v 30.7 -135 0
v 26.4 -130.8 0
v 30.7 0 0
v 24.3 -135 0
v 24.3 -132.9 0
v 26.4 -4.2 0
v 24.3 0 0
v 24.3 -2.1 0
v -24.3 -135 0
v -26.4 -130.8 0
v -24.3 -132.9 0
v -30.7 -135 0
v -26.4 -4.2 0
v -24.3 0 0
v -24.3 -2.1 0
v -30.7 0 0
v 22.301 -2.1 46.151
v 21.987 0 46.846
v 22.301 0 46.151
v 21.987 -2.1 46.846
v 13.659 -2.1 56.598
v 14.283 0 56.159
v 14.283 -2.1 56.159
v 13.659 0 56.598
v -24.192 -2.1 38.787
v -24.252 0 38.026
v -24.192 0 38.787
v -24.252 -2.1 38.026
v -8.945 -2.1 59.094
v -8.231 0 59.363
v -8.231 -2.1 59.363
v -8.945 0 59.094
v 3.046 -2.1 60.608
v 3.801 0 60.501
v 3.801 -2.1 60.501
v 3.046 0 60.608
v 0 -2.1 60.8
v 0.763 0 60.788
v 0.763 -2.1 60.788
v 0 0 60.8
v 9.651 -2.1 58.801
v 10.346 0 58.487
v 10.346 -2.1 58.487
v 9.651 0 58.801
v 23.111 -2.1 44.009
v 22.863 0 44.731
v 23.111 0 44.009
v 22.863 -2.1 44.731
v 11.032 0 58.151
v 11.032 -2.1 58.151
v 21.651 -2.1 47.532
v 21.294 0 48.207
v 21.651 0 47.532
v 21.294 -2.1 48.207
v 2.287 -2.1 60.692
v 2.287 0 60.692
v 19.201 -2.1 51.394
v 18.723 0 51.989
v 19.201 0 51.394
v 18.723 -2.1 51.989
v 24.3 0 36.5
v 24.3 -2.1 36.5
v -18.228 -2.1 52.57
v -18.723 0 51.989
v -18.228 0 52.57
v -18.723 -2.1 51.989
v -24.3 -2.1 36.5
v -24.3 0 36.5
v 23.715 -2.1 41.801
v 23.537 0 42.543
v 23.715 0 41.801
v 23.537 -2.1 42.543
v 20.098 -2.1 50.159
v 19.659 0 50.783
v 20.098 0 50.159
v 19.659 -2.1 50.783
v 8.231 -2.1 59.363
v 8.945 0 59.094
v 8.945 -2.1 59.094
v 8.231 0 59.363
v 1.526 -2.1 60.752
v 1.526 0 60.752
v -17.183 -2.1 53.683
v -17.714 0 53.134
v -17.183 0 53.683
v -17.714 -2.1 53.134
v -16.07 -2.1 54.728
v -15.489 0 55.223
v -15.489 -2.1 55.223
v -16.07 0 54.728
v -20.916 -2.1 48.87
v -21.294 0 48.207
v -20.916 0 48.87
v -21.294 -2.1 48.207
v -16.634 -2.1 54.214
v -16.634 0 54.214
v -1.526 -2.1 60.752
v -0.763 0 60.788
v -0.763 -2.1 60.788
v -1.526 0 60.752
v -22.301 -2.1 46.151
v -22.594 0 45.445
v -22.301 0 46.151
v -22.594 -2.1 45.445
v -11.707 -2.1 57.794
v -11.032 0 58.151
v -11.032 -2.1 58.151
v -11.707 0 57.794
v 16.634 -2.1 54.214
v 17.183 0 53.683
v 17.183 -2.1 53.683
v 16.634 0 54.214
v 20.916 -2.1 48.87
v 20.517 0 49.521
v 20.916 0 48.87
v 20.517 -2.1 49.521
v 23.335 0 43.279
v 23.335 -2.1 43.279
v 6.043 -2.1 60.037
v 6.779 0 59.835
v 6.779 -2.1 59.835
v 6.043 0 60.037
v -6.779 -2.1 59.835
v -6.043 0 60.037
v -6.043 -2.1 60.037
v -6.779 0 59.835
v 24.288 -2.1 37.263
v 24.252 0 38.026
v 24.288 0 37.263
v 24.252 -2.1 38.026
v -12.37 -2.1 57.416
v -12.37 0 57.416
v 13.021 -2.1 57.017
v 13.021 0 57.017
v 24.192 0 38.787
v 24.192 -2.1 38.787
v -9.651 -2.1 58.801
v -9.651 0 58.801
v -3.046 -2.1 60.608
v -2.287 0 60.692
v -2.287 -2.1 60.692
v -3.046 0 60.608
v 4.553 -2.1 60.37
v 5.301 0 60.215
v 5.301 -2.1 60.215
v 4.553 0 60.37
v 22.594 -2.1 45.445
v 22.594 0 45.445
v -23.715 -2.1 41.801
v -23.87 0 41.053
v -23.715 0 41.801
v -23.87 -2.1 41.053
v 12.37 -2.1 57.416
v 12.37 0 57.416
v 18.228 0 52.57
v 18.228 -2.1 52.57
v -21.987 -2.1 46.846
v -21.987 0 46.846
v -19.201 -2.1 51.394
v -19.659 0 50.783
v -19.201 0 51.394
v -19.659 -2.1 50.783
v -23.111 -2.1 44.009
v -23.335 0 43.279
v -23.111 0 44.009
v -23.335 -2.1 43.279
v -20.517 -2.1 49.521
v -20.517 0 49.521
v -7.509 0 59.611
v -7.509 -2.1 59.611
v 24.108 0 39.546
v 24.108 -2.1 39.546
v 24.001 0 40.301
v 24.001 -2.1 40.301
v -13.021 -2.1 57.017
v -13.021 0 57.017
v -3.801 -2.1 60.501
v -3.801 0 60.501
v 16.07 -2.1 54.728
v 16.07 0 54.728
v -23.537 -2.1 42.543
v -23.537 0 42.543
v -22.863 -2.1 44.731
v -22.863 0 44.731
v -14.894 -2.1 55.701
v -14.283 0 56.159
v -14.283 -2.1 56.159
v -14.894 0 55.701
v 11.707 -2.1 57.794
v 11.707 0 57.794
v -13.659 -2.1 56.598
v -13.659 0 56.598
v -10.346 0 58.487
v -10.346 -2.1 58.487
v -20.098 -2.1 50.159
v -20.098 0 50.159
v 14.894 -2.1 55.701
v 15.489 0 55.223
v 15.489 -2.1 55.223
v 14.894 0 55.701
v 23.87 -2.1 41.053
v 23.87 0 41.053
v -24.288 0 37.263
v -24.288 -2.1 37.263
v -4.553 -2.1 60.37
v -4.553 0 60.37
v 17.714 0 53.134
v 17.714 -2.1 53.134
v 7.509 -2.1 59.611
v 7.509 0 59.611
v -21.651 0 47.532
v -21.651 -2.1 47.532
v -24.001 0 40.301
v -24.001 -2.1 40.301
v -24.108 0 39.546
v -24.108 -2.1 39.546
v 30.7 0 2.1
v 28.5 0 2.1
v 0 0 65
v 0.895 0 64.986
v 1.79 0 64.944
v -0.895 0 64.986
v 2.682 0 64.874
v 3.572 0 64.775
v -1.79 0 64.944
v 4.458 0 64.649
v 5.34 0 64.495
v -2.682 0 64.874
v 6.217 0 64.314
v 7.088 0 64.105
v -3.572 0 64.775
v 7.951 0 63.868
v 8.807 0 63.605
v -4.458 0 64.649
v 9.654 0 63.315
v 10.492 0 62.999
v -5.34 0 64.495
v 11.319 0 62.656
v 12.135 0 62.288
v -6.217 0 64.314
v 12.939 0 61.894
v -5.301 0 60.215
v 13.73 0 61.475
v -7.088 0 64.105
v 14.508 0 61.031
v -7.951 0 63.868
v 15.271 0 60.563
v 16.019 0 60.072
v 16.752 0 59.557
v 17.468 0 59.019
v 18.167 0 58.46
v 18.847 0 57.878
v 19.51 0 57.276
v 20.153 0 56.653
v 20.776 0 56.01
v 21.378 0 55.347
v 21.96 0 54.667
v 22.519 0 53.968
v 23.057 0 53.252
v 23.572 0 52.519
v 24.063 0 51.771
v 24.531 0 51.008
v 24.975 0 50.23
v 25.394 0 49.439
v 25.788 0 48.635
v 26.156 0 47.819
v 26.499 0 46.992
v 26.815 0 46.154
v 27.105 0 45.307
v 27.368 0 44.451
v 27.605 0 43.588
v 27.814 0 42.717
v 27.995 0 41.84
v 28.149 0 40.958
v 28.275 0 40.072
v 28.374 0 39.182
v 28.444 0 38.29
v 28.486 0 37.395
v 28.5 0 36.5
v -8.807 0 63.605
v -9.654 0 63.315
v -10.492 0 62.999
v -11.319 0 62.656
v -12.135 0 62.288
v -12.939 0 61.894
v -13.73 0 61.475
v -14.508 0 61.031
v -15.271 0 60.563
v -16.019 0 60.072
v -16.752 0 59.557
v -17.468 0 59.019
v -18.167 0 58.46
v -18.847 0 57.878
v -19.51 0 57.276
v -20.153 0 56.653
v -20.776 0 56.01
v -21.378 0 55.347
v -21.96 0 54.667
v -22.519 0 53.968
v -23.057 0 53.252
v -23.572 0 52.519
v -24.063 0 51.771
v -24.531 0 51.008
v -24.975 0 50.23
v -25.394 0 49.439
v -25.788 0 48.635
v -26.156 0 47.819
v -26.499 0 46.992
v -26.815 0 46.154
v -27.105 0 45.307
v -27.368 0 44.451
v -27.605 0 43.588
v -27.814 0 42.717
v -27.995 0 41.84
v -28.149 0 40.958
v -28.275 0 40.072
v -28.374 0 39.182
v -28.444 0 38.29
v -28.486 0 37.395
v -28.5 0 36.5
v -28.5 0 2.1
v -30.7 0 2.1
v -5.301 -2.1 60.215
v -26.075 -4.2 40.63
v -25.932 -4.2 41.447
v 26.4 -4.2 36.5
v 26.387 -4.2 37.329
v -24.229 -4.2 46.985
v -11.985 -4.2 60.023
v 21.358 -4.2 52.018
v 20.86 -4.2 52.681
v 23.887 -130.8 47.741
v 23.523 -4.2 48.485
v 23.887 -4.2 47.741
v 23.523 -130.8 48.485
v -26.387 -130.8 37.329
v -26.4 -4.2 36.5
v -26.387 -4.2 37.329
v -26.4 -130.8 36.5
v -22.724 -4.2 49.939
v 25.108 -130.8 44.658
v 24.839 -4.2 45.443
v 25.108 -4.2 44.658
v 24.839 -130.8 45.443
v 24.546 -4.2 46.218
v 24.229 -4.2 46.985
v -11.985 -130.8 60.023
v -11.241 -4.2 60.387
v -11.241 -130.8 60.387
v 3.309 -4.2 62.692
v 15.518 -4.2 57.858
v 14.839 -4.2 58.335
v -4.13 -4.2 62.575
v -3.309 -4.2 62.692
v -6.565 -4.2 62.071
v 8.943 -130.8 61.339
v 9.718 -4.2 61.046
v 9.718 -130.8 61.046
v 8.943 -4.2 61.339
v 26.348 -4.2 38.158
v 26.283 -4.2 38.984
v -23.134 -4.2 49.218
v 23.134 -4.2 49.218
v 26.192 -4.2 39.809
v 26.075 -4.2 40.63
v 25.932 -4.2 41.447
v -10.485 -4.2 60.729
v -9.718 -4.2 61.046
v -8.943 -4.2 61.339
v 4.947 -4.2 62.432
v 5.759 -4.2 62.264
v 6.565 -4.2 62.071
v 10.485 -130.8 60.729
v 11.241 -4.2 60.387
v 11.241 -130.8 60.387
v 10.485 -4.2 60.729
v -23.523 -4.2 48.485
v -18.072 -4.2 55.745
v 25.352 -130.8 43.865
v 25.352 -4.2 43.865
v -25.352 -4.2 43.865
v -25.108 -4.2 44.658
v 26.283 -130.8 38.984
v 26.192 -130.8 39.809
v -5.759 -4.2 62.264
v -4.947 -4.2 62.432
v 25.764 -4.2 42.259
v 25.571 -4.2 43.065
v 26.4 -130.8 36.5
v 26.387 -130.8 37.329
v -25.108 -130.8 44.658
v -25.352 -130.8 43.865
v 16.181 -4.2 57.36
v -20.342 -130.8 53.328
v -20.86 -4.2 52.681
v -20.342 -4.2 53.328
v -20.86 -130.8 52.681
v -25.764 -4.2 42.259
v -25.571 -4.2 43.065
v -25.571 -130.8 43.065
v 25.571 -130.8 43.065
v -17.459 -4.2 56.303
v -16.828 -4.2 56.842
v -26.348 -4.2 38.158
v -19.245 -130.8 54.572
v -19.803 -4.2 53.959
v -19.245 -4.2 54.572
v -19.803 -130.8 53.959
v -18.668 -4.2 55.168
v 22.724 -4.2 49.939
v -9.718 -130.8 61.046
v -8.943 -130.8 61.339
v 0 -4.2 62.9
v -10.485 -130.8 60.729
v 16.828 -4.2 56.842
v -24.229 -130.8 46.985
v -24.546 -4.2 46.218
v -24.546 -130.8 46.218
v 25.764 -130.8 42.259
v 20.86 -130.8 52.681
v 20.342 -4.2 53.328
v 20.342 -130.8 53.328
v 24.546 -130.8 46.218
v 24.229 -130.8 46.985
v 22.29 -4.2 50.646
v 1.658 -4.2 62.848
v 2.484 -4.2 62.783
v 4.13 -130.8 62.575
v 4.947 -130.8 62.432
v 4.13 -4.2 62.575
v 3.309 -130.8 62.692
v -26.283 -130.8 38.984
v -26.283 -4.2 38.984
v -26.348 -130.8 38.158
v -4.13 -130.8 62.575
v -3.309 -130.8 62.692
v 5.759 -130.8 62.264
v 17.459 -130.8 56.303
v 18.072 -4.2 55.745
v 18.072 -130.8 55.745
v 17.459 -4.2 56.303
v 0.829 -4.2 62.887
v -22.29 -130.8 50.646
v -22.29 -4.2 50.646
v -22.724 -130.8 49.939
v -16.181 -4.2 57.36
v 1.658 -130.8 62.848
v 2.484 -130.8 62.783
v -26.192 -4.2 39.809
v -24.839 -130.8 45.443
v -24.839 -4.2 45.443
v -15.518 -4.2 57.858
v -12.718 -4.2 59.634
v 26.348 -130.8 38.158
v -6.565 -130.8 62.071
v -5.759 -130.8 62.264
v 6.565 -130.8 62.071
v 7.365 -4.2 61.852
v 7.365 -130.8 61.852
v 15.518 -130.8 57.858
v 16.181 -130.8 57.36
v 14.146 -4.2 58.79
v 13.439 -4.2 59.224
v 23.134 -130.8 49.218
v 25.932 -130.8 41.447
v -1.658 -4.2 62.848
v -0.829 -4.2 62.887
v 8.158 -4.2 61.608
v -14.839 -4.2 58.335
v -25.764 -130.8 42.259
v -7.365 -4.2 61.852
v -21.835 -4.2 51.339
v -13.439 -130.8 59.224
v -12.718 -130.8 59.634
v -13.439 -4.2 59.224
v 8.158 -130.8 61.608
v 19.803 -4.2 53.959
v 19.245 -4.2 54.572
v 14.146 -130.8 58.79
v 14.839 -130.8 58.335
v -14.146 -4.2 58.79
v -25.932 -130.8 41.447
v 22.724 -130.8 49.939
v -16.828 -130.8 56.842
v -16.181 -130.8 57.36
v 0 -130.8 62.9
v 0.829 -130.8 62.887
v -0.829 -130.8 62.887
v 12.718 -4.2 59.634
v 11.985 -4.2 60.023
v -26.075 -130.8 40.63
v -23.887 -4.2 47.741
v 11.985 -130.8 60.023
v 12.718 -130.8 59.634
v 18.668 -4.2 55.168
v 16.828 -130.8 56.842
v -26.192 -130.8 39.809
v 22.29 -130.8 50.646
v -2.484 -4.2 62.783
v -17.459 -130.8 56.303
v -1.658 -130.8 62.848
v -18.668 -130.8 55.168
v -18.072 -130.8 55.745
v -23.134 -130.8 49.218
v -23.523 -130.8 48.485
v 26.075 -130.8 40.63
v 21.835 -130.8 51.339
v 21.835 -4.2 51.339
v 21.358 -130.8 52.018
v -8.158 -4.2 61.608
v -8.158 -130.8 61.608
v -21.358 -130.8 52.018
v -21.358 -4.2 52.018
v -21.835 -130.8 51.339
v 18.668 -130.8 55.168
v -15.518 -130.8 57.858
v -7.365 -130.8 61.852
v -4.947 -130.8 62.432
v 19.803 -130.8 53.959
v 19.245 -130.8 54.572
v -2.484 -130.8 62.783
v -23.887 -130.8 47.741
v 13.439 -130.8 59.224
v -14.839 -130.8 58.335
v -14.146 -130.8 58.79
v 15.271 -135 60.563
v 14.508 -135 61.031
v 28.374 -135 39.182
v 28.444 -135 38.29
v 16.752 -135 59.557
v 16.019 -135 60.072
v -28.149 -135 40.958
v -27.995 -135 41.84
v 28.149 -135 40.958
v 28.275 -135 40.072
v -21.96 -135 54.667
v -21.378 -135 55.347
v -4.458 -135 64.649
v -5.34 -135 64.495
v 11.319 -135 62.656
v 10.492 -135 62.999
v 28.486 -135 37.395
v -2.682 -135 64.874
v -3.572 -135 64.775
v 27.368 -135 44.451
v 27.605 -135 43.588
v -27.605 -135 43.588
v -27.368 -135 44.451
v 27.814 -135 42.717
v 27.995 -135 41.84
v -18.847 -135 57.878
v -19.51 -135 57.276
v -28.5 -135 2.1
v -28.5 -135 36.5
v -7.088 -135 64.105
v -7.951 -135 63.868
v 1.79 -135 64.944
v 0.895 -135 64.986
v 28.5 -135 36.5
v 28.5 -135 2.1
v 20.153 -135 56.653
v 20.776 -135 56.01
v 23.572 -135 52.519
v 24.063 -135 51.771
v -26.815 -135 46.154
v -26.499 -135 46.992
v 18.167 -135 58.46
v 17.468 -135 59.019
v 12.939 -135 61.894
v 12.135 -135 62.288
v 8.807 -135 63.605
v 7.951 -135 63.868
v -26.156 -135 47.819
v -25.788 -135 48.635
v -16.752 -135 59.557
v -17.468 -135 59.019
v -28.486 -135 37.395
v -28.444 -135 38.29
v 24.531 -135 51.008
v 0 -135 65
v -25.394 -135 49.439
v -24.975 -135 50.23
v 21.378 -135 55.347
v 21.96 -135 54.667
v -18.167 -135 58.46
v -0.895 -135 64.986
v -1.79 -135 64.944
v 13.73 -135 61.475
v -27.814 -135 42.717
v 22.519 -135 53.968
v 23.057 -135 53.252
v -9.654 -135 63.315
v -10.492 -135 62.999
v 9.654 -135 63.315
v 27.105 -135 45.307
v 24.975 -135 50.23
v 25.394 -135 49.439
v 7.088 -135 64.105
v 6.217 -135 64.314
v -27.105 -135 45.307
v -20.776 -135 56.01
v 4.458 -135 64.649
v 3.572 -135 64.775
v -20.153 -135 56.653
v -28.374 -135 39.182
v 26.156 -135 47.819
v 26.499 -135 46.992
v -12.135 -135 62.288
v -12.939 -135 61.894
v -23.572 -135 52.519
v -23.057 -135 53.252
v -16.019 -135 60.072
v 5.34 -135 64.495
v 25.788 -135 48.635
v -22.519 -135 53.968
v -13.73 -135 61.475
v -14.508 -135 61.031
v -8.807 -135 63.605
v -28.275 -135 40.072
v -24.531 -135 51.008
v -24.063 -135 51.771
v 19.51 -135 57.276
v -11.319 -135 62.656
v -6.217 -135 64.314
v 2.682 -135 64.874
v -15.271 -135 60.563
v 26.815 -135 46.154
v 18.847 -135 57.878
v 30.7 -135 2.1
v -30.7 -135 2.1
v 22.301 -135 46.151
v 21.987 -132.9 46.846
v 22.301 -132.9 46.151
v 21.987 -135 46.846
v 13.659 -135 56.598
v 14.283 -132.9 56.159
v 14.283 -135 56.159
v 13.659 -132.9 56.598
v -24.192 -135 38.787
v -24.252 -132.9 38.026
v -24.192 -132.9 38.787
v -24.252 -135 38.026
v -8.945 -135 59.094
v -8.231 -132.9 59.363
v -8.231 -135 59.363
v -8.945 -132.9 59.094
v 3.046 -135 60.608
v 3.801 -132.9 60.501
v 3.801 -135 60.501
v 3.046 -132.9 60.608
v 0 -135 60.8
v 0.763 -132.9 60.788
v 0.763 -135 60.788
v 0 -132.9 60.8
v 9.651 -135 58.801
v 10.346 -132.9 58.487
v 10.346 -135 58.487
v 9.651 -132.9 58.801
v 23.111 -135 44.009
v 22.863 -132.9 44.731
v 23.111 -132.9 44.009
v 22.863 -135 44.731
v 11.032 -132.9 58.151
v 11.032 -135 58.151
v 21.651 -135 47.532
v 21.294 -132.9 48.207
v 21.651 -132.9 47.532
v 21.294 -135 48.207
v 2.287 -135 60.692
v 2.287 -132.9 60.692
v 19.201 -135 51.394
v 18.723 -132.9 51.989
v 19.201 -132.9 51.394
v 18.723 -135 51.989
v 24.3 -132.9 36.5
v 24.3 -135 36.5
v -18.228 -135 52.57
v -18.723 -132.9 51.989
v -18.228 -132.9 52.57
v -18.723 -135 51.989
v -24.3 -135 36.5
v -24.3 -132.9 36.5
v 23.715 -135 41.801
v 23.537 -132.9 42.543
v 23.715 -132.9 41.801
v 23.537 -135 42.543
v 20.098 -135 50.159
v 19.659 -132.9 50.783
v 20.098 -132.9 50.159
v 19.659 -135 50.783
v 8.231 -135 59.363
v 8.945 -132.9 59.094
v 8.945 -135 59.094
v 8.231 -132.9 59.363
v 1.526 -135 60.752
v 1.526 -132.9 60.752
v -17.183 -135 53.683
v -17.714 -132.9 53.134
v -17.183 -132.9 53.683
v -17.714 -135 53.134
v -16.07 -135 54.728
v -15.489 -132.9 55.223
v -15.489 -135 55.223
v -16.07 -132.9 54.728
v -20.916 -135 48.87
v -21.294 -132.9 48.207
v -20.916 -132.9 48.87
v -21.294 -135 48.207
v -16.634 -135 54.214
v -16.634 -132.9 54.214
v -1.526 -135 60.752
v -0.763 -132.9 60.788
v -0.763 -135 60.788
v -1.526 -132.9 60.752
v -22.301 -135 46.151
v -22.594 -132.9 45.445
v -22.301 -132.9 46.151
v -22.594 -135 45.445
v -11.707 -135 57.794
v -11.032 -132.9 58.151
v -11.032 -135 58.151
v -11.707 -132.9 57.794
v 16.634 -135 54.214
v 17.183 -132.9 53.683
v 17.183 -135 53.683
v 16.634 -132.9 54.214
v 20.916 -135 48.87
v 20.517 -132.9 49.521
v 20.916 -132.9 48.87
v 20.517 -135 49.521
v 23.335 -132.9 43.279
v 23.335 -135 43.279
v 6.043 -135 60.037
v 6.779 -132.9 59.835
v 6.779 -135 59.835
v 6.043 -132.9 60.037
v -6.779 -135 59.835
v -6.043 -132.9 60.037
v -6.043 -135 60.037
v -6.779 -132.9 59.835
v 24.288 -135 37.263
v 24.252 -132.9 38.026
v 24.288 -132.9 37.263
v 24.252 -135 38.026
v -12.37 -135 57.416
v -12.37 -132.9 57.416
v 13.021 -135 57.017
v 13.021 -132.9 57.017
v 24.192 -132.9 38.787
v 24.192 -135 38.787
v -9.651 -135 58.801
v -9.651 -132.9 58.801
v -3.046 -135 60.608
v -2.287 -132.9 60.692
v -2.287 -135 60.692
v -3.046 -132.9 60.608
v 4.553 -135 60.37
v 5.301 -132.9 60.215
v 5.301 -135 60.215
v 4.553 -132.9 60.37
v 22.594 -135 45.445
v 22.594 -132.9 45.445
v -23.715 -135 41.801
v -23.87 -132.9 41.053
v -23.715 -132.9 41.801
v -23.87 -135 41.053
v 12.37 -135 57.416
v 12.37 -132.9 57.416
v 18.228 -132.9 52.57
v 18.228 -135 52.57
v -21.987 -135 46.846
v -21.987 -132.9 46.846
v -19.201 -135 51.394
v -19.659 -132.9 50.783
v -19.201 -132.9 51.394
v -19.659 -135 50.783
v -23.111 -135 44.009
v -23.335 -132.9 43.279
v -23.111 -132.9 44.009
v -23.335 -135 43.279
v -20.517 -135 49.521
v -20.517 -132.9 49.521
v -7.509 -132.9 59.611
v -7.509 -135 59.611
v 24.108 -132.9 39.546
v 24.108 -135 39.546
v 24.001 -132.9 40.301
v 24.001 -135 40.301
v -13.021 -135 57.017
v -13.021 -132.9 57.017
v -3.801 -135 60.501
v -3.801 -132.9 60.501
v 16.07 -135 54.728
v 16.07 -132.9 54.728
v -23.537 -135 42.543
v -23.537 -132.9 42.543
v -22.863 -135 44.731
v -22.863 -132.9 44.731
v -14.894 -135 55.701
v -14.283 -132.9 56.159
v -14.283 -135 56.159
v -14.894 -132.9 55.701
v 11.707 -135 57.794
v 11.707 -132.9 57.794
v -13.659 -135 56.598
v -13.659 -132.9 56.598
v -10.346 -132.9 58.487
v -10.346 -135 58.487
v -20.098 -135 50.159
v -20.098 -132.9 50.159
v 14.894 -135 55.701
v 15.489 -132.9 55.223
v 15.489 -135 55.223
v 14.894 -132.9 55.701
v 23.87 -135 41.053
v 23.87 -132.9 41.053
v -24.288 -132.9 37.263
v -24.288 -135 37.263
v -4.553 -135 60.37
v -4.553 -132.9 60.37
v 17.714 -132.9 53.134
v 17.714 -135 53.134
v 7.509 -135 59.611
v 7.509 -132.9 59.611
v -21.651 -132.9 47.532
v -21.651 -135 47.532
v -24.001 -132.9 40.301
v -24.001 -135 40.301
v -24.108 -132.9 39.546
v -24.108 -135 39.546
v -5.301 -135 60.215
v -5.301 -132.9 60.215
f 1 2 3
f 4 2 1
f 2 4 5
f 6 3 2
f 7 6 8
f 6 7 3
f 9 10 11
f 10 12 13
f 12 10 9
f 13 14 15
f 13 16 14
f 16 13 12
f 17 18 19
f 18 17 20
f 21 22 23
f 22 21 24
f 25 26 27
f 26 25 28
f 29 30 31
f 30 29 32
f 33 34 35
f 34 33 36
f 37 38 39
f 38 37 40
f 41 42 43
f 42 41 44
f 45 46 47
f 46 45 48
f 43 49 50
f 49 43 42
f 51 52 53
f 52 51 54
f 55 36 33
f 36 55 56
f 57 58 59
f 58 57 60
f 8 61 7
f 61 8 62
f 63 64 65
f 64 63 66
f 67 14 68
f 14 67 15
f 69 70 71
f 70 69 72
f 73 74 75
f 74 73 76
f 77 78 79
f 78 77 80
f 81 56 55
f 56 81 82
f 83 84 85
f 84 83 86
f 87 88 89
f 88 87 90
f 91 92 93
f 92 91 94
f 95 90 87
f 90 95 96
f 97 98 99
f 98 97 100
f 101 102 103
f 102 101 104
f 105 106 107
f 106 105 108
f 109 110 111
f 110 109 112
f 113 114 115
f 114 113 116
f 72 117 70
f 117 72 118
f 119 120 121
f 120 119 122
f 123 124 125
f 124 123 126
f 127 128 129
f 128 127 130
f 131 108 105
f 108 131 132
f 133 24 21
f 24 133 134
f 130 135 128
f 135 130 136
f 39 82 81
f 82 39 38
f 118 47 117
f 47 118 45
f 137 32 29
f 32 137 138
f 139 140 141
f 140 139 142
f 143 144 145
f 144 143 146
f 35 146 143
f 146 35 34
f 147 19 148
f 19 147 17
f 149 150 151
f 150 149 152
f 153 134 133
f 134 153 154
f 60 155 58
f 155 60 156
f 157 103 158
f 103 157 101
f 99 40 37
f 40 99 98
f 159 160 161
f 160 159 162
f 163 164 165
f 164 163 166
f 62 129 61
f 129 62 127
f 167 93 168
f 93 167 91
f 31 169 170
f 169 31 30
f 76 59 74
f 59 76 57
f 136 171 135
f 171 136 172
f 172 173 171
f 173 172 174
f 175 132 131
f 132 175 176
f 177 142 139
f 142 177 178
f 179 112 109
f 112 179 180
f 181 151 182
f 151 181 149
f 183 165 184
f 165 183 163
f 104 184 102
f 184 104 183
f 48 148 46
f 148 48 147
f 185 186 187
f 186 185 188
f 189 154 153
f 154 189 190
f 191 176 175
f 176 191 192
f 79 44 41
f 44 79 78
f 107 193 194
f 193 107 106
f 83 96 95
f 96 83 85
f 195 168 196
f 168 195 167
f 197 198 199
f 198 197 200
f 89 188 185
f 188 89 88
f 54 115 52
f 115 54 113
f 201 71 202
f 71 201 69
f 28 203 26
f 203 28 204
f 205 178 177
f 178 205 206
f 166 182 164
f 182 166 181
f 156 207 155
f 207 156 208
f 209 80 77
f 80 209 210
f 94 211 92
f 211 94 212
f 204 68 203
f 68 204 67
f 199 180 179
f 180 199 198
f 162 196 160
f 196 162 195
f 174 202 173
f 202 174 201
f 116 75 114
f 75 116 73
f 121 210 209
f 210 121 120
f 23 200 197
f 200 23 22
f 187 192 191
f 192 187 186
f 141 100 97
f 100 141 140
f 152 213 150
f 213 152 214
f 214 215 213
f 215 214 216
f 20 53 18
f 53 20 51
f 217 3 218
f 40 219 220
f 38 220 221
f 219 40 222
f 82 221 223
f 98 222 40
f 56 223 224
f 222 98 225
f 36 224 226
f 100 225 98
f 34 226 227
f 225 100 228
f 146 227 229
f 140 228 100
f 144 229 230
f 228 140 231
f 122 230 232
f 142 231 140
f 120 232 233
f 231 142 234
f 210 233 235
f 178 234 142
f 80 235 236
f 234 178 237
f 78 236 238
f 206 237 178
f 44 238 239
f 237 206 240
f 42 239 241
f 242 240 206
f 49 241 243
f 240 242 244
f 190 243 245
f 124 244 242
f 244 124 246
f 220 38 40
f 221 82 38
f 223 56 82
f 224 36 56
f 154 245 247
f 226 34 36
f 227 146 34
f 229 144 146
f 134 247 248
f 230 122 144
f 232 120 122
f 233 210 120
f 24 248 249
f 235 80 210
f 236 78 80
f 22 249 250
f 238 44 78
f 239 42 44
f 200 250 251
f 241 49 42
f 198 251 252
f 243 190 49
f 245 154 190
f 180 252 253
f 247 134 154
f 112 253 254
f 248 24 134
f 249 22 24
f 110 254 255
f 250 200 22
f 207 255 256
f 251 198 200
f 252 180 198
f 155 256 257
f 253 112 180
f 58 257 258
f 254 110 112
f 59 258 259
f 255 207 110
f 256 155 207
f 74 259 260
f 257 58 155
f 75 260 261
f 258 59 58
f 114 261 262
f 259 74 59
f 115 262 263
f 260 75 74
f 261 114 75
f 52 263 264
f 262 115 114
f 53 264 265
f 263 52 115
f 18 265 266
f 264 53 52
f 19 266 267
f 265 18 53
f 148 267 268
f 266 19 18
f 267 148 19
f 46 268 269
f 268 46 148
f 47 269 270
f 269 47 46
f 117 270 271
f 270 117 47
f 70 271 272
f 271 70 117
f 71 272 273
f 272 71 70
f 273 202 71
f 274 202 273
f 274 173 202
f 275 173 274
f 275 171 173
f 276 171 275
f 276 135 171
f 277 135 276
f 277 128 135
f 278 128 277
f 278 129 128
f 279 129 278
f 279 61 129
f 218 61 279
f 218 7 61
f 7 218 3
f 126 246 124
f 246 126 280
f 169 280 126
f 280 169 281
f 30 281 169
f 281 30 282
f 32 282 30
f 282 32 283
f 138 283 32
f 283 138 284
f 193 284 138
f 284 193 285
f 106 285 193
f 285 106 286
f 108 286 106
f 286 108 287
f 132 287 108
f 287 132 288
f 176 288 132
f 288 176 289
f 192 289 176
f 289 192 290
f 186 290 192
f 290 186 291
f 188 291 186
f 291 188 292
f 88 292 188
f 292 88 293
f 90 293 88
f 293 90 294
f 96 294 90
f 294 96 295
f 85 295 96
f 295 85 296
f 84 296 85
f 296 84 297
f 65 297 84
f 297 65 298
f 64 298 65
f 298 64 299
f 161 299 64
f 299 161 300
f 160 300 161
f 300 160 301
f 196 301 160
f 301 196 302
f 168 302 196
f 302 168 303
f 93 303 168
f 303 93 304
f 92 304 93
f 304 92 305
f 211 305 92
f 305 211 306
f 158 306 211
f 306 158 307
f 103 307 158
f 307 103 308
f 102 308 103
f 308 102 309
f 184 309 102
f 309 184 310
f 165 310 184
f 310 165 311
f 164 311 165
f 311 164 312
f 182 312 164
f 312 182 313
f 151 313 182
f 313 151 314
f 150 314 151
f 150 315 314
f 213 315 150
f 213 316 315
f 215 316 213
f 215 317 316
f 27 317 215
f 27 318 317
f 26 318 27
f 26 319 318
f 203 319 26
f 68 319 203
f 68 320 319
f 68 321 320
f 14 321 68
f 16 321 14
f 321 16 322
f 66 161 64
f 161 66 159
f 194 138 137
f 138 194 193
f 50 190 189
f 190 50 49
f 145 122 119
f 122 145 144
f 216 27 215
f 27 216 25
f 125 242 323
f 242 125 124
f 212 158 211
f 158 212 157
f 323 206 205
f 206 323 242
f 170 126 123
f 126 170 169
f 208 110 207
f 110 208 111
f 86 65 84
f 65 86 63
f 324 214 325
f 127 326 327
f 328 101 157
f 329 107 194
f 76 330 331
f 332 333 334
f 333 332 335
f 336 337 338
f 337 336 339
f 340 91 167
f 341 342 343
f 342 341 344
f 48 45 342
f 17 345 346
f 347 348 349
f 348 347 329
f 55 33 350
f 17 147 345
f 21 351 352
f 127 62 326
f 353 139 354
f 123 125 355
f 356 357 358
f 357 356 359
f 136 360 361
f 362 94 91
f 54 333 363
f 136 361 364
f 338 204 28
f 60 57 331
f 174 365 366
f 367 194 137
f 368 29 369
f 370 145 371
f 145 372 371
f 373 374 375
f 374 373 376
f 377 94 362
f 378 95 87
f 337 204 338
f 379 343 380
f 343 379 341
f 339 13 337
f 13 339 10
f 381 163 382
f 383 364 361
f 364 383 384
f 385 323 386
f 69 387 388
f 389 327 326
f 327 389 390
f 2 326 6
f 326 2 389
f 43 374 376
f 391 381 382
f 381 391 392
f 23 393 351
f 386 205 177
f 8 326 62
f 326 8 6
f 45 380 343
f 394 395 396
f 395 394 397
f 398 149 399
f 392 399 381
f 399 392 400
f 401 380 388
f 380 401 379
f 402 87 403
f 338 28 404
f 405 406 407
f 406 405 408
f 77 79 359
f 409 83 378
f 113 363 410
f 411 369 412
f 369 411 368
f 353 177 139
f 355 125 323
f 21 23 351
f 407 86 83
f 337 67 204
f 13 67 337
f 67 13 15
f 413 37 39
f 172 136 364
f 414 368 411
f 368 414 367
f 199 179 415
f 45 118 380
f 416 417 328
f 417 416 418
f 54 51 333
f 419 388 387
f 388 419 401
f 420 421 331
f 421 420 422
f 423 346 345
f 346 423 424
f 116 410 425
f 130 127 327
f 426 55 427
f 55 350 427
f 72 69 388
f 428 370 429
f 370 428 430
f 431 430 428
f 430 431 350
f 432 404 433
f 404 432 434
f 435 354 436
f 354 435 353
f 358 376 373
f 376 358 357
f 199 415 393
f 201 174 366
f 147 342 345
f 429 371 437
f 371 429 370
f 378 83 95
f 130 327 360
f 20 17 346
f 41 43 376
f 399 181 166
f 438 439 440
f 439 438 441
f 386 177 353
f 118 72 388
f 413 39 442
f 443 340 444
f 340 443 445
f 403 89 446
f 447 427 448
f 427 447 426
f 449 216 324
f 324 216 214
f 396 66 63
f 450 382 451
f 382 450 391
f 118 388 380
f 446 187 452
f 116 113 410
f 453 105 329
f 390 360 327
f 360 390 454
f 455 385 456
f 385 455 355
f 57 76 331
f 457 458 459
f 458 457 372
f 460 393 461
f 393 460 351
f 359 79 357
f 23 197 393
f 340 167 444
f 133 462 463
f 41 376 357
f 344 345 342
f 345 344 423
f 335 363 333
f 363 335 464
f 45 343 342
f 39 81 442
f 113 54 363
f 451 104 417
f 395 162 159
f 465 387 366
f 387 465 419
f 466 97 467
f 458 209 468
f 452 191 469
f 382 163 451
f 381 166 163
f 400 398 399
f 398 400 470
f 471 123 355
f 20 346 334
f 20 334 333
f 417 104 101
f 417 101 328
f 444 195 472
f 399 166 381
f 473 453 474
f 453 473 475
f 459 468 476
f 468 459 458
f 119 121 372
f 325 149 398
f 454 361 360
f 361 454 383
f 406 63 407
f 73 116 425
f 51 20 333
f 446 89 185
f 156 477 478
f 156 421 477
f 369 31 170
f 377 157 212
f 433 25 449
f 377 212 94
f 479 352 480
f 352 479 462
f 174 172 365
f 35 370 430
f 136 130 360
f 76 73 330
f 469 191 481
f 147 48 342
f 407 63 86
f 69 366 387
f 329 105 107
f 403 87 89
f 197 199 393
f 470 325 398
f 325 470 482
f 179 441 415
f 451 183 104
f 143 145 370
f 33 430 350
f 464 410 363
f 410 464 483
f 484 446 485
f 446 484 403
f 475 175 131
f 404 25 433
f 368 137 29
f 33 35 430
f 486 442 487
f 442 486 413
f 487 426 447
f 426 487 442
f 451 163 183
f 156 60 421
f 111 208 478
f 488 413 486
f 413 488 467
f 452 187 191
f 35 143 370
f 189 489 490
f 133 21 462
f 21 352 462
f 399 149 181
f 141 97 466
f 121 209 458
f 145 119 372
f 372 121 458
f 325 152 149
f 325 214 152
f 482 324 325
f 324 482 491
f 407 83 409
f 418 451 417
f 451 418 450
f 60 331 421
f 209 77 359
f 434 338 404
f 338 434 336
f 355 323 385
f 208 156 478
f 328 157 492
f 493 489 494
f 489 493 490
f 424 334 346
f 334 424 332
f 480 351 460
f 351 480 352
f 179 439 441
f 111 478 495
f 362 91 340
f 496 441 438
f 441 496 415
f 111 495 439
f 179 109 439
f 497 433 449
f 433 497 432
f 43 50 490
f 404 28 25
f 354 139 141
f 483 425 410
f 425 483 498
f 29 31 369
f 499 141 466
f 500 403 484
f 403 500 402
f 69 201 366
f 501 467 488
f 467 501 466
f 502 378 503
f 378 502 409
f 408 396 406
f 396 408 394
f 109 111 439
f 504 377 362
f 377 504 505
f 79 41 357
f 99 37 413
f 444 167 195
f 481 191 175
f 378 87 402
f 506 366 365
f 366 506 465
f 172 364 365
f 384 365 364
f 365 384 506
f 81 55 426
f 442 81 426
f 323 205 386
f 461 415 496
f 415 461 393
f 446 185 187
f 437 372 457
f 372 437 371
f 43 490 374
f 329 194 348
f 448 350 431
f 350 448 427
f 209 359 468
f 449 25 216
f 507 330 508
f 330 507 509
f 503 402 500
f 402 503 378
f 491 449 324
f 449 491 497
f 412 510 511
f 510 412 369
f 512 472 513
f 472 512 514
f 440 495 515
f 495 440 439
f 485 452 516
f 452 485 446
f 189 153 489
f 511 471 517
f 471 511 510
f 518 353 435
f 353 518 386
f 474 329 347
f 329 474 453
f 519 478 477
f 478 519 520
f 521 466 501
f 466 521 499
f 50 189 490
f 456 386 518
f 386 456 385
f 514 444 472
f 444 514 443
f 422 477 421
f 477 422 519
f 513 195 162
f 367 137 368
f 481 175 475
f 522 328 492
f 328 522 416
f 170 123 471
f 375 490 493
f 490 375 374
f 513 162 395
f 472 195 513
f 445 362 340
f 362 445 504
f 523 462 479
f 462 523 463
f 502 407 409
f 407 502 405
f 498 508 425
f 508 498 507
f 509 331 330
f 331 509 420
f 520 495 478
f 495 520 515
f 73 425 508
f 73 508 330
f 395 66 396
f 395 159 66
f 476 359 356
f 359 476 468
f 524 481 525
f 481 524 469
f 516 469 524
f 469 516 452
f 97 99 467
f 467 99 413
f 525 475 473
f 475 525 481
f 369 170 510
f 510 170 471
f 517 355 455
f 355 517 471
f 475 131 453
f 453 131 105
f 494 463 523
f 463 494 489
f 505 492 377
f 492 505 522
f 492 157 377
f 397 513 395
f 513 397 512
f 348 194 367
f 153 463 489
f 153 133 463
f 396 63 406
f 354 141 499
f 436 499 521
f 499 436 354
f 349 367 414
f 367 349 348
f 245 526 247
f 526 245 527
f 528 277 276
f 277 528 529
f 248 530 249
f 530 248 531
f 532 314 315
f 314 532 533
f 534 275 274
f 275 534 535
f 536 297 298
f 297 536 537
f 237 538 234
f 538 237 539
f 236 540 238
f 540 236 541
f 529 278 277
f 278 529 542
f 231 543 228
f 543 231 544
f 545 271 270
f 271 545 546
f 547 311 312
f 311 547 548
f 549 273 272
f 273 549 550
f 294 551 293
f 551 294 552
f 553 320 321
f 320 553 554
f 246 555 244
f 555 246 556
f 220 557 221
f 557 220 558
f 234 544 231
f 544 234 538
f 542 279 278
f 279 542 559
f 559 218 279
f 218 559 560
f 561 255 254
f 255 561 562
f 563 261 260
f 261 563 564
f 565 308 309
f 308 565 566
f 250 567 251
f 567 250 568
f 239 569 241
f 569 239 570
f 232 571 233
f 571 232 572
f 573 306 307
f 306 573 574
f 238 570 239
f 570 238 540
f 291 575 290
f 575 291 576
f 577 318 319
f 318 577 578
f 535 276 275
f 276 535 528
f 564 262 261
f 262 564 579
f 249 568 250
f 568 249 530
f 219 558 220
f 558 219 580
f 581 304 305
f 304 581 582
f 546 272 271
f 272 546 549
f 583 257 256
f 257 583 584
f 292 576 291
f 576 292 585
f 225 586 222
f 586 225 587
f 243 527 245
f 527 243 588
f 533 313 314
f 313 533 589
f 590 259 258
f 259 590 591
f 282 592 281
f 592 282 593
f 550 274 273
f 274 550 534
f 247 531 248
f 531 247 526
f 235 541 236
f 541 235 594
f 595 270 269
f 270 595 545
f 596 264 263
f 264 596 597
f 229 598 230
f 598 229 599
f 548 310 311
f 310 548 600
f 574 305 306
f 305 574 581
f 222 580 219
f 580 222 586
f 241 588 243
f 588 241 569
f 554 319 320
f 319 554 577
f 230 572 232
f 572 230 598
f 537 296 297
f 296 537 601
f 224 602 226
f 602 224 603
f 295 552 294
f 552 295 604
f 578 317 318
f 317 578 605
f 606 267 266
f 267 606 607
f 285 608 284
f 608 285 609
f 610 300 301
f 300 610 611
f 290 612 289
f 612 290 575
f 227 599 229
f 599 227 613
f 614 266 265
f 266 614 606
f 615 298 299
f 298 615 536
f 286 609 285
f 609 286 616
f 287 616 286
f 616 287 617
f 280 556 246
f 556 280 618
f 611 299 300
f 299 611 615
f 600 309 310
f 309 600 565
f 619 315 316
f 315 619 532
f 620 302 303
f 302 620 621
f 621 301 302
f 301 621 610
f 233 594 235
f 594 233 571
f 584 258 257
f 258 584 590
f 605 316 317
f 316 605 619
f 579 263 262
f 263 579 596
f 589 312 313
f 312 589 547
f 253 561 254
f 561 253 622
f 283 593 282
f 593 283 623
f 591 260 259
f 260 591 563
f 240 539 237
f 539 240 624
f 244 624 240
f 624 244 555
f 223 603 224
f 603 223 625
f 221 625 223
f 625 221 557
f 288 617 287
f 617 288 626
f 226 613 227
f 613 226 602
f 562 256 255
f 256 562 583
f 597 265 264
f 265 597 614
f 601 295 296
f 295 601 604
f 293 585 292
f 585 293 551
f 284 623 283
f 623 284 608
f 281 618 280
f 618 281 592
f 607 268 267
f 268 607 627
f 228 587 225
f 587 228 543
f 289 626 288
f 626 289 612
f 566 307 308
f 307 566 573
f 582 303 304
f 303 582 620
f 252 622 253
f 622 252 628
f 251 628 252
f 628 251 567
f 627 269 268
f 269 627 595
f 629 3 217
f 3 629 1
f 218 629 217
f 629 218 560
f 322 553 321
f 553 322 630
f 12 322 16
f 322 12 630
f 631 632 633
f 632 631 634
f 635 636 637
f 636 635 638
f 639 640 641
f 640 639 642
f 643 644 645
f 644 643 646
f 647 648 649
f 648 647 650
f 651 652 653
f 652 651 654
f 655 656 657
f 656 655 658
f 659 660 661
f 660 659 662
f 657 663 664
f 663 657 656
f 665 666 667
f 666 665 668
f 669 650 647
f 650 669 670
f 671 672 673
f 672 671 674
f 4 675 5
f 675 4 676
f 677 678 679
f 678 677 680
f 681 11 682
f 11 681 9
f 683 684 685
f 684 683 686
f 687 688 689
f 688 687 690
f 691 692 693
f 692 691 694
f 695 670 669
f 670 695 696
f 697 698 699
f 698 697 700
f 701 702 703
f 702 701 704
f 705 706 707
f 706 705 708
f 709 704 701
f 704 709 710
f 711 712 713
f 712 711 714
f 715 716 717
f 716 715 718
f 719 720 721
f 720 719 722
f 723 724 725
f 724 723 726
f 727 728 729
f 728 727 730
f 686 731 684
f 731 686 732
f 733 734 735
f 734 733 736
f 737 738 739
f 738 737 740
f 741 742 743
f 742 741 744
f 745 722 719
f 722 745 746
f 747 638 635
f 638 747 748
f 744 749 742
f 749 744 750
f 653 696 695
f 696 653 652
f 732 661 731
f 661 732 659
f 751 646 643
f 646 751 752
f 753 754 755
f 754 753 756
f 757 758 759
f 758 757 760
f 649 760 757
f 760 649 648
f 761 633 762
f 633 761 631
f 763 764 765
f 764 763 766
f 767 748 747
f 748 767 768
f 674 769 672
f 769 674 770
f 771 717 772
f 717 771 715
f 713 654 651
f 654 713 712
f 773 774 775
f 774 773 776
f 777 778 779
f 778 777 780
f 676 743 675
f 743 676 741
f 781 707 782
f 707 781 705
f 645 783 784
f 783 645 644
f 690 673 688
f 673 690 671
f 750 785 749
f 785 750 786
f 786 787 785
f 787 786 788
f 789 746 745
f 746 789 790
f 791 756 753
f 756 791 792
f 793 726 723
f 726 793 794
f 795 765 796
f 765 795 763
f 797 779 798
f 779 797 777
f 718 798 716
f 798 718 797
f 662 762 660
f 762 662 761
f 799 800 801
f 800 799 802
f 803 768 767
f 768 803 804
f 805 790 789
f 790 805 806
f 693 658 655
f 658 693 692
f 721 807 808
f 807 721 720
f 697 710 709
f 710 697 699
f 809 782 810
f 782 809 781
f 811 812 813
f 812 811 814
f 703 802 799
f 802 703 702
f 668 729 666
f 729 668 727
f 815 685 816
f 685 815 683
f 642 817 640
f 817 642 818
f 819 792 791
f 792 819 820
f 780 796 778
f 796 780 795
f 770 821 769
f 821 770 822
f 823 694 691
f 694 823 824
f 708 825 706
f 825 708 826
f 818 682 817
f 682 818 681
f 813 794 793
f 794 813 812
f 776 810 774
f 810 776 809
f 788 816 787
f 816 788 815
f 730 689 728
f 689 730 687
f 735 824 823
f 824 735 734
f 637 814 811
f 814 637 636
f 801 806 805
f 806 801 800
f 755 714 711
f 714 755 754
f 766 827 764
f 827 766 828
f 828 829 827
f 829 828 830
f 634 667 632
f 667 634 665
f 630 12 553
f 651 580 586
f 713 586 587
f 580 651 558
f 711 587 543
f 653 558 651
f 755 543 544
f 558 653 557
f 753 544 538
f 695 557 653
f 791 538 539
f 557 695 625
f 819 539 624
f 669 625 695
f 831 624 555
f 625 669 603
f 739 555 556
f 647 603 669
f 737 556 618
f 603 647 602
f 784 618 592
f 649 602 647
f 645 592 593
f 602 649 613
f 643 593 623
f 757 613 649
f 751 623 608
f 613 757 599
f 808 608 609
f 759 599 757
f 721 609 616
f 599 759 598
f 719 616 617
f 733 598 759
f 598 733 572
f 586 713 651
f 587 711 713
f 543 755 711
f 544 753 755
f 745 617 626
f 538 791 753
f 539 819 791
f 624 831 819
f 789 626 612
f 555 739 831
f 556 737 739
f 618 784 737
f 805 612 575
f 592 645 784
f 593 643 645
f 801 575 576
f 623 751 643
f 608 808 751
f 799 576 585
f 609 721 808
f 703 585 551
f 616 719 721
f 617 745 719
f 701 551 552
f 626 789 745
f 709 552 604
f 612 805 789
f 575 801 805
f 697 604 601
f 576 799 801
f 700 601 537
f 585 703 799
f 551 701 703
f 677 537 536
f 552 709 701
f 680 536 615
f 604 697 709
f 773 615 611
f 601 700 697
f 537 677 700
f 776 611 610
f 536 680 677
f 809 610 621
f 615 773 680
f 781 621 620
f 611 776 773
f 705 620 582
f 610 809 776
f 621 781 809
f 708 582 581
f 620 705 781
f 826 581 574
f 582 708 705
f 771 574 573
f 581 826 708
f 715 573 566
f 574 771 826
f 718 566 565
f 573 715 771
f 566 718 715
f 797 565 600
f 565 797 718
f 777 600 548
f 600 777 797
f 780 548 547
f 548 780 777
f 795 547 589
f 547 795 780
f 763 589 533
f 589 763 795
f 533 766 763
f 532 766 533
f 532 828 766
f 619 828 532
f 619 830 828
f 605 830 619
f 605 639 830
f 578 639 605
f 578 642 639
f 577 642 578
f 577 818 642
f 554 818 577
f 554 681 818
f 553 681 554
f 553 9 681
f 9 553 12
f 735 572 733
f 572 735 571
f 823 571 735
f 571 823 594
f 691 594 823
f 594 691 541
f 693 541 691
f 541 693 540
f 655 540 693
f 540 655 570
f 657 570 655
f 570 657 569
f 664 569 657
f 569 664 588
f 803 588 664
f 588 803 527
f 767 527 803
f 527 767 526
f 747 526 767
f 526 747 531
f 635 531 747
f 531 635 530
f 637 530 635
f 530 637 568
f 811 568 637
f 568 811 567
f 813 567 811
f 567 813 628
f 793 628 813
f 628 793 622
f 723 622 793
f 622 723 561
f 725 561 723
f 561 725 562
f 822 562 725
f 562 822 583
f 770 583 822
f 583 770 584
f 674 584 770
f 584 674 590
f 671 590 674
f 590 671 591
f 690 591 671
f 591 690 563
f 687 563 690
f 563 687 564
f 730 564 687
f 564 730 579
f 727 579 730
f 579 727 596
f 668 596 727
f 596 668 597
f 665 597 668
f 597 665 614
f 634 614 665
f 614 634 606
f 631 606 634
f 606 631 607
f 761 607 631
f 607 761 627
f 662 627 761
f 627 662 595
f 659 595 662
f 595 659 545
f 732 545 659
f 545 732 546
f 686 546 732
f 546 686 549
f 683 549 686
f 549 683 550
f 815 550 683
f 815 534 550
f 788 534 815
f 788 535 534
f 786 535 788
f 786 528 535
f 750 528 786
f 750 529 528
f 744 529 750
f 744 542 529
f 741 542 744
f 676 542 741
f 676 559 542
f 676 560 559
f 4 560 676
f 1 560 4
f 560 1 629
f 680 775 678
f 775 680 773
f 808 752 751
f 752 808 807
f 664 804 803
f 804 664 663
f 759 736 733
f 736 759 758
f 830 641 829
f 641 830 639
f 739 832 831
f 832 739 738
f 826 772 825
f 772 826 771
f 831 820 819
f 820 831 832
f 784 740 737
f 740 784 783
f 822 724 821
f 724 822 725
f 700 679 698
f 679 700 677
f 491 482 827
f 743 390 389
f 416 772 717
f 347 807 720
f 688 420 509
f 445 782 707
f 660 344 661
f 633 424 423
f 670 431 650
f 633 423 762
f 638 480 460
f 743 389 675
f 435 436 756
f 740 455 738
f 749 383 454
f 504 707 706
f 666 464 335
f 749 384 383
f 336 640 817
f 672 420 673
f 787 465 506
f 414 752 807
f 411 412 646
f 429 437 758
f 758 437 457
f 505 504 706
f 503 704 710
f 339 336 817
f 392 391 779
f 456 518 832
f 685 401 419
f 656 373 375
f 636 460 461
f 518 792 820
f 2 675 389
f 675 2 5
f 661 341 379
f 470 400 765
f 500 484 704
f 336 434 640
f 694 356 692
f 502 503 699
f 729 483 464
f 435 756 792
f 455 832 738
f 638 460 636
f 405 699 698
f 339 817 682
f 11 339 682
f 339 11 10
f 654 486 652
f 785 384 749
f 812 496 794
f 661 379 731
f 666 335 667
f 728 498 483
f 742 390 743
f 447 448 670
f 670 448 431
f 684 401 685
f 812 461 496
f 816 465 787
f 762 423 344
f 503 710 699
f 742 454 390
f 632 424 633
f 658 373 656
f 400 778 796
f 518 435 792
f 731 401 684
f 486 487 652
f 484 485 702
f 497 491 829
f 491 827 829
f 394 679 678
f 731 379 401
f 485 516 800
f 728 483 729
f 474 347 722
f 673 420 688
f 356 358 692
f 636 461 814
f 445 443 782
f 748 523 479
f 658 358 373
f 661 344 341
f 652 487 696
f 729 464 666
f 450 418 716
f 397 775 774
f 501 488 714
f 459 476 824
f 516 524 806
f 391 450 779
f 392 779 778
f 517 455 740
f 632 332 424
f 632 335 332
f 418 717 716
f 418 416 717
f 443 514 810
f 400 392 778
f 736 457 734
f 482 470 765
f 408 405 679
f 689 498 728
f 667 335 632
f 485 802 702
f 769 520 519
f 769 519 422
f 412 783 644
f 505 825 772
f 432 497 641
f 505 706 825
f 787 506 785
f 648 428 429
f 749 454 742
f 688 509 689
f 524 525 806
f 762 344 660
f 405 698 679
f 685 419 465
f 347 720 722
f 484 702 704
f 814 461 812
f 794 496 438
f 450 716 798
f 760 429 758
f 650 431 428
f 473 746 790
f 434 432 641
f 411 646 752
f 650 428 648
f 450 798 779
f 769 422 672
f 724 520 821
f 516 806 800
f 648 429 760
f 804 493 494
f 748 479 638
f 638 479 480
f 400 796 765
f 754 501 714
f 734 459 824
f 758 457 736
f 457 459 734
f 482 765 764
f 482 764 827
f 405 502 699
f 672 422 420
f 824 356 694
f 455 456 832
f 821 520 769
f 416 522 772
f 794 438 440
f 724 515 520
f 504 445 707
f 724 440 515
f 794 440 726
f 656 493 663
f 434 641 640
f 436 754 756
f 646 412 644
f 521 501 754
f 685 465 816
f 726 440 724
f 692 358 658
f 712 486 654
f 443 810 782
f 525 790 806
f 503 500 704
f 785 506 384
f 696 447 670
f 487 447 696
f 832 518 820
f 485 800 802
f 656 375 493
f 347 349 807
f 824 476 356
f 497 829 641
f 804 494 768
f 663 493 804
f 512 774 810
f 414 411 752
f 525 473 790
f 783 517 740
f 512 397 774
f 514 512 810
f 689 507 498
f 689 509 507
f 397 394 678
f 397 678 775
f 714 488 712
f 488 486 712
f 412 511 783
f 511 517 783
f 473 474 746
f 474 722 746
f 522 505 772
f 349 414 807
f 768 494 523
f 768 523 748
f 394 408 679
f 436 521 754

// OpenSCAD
include <lib/brio.scad>

//brio_straight(LENGTH);
//brio_straight((3/4)*LENGTH);
//brio_straight((1/2)*LENGTH);
//brio_straight((1/4)*LENGTH);
//brio_curved(ROUND_R, 8); // inner radius, Nth part
//brio_curved(ROUND_R, 16); // inner radius, Nth part
//brio_bridge();
//brio_cross(LENGTH/2);
//brio_splitter();
//brio_splitter_round();
//brio_support();
brio_tunnel();
//brio_connector(CONN_LEN);
